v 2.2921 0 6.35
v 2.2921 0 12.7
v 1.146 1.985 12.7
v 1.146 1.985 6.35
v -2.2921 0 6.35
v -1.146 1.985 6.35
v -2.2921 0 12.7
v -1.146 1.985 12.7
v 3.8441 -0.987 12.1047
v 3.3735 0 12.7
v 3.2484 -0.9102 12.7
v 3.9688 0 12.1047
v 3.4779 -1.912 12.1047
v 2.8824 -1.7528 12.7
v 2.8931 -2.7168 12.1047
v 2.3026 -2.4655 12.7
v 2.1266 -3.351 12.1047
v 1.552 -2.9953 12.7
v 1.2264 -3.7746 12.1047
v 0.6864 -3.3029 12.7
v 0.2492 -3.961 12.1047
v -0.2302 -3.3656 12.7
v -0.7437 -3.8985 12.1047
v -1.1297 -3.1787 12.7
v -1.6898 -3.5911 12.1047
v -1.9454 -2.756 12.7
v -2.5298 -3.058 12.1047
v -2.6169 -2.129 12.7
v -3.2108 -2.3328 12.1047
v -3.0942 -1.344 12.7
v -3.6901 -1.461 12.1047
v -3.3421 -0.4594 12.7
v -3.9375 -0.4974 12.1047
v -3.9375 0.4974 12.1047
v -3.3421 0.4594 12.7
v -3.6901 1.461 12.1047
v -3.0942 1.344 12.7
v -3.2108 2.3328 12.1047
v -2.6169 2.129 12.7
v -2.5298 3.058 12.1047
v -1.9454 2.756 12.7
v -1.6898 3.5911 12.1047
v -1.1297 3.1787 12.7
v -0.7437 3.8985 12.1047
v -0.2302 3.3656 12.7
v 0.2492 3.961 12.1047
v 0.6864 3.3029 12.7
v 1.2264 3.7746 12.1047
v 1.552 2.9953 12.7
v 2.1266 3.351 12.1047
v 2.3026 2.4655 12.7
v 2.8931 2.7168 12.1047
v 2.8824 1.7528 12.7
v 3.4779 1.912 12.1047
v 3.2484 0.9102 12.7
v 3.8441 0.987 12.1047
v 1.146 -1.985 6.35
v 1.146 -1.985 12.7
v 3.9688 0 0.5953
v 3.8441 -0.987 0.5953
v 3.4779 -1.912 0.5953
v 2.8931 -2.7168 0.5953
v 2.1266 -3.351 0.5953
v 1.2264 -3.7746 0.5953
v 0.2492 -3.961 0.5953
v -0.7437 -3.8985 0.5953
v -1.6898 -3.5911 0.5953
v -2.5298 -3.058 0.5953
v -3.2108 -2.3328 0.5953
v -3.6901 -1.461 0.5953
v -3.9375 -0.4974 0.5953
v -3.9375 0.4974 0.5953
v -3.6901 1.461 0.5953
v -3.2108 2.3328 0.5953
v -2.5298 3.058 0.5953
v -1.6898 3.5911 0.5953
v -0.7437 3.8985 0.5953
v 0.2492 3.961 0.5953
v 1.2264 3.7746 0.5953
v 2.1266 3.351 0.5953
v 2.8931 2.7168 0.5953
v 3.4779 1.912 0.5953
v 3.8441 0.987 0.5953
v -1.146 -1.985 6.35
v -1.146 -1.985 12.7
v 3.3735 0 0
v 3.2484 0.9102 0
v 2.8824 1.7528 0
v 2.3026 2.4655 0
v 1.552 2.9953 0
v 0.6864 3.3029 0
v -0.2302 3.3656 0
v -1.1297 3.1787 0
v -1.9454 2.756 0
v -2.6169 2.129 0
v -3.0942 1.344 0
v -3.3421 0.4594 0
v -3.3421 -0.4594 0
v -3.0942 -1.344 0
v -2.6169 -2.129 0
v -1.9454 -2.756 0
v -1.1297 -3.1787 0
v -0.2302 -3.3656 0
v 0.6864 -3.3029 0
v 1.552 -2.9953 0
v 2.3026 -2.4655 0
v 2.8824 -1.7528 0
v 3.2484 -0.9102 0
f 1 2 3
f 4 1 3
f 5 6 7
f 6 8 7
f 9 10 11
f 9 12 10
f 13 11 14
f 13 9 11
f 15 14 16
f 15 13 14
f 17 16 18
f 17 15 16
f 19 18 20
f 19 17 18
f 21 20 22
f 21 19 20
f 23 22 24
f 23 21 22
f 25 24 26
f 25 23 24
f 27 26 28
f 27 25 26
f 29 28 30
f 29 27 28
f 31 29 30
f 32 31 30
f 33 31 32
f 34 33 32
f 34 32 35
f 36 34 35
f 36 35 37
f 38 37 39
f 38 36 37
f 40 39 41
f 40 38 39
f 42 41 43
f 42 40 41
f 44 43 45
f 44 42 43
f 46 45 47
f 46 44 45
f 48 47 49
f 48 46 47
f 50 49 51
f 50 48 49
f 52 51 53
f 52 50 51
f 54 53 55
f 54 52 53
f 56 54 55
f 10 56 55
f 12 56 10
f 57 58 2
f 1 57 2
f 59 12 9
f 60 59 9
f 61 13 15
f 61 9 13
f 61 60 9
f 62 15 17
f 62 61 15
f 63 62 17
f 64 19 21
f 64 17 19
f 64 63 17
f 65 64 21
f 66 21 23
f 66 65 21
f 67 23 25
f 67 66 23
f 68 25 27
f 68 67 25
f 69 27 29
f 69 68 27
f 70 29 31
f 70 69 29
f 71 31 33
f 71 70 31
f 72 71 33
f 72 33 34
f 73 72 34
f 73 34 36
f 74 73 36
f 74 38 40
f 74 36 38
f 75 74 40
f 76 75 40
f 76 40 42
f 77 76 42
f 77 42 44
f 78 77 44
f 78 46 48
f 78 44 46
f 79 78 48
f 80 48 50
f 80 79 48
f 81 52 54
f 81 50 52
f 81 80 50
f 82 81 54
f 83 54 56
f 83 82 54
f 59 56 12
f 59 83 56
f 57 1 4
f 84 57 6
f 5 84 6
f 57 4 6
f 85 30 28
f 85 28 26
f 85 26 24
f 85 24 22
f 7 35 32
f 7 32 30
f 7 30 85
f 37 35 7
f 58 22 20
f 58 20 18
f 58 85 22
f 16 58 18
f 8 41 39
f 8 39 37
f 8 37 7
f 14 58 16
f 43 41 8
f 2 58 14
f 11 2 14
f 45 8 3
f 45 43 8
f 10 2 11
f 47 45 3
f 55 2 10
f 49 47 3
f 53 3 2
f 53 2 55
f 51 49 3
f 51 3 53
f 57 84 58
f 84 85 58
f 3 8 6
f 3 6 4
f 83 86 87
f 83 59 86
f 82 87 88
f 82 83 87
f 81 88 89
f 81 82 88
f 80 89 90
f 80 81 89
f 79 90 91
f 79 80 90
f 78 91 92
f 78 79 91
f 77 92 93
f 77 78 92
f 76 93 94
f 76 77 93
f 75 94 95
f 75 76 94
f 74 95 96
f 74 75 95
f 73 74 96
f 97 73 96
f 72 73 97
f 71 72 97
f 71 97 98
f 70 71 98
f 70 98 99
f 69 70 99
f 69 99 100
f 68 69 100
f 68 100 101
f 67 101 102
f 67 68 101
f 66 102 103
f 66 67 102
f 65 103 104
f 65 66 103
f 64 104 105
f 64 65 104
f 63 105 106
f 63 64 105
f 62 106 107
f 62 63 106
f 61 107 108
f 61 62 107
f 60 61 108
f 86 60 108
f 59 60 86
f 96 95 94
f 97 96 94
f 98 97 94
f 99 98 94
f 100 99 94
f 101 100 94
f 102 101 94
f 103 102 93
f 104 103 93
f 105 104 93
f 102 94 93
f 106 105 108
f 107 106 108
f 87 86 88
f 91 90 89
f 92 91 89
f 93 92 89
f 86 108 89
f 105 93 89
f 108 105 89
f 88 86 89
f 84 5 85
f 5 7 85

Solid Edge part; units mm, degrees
sketch "Sketch1" plane through (0, 0, 0) normal (0, 0, 1) x (1, 0, 0)
  circle A0 centre (0, 0) radius 3.9688
  dimension "D1" = 7.9375
extrude "Protrusion1" add sketch "Sketch1" along normal blind 12.7
chamfer "Chamfer1" distance 0.5953 angle 45 2 edges at (-3.9687, 0, 0) (-3.9687, 0, 12.7)
sketch "Sketch2" plane through (0, 0, 12.7) normal (0, 0, 1) x (1, 0, 0)
  line L0 (-1.146, 1.985) -> (1.146, 1.985)
  line L1 (2.2921, 0) -> (1.146, 1.985)
  line L2 (1.146, -1.985) -> (2.2921, 0)
  line L3 (-1.146, -1.985) -> (1.146, -1.985)
  line L4 (-2.2921, 0) -> (-1.146, -1.985)
  line L5 (-1.146, 1.985) -> (-2.2921, 0)
  dimension "D1" = 3.97
extrude "Cutout1" cut sketch "Sketch2" against normal blind 6.35
properties part number "24107663"
